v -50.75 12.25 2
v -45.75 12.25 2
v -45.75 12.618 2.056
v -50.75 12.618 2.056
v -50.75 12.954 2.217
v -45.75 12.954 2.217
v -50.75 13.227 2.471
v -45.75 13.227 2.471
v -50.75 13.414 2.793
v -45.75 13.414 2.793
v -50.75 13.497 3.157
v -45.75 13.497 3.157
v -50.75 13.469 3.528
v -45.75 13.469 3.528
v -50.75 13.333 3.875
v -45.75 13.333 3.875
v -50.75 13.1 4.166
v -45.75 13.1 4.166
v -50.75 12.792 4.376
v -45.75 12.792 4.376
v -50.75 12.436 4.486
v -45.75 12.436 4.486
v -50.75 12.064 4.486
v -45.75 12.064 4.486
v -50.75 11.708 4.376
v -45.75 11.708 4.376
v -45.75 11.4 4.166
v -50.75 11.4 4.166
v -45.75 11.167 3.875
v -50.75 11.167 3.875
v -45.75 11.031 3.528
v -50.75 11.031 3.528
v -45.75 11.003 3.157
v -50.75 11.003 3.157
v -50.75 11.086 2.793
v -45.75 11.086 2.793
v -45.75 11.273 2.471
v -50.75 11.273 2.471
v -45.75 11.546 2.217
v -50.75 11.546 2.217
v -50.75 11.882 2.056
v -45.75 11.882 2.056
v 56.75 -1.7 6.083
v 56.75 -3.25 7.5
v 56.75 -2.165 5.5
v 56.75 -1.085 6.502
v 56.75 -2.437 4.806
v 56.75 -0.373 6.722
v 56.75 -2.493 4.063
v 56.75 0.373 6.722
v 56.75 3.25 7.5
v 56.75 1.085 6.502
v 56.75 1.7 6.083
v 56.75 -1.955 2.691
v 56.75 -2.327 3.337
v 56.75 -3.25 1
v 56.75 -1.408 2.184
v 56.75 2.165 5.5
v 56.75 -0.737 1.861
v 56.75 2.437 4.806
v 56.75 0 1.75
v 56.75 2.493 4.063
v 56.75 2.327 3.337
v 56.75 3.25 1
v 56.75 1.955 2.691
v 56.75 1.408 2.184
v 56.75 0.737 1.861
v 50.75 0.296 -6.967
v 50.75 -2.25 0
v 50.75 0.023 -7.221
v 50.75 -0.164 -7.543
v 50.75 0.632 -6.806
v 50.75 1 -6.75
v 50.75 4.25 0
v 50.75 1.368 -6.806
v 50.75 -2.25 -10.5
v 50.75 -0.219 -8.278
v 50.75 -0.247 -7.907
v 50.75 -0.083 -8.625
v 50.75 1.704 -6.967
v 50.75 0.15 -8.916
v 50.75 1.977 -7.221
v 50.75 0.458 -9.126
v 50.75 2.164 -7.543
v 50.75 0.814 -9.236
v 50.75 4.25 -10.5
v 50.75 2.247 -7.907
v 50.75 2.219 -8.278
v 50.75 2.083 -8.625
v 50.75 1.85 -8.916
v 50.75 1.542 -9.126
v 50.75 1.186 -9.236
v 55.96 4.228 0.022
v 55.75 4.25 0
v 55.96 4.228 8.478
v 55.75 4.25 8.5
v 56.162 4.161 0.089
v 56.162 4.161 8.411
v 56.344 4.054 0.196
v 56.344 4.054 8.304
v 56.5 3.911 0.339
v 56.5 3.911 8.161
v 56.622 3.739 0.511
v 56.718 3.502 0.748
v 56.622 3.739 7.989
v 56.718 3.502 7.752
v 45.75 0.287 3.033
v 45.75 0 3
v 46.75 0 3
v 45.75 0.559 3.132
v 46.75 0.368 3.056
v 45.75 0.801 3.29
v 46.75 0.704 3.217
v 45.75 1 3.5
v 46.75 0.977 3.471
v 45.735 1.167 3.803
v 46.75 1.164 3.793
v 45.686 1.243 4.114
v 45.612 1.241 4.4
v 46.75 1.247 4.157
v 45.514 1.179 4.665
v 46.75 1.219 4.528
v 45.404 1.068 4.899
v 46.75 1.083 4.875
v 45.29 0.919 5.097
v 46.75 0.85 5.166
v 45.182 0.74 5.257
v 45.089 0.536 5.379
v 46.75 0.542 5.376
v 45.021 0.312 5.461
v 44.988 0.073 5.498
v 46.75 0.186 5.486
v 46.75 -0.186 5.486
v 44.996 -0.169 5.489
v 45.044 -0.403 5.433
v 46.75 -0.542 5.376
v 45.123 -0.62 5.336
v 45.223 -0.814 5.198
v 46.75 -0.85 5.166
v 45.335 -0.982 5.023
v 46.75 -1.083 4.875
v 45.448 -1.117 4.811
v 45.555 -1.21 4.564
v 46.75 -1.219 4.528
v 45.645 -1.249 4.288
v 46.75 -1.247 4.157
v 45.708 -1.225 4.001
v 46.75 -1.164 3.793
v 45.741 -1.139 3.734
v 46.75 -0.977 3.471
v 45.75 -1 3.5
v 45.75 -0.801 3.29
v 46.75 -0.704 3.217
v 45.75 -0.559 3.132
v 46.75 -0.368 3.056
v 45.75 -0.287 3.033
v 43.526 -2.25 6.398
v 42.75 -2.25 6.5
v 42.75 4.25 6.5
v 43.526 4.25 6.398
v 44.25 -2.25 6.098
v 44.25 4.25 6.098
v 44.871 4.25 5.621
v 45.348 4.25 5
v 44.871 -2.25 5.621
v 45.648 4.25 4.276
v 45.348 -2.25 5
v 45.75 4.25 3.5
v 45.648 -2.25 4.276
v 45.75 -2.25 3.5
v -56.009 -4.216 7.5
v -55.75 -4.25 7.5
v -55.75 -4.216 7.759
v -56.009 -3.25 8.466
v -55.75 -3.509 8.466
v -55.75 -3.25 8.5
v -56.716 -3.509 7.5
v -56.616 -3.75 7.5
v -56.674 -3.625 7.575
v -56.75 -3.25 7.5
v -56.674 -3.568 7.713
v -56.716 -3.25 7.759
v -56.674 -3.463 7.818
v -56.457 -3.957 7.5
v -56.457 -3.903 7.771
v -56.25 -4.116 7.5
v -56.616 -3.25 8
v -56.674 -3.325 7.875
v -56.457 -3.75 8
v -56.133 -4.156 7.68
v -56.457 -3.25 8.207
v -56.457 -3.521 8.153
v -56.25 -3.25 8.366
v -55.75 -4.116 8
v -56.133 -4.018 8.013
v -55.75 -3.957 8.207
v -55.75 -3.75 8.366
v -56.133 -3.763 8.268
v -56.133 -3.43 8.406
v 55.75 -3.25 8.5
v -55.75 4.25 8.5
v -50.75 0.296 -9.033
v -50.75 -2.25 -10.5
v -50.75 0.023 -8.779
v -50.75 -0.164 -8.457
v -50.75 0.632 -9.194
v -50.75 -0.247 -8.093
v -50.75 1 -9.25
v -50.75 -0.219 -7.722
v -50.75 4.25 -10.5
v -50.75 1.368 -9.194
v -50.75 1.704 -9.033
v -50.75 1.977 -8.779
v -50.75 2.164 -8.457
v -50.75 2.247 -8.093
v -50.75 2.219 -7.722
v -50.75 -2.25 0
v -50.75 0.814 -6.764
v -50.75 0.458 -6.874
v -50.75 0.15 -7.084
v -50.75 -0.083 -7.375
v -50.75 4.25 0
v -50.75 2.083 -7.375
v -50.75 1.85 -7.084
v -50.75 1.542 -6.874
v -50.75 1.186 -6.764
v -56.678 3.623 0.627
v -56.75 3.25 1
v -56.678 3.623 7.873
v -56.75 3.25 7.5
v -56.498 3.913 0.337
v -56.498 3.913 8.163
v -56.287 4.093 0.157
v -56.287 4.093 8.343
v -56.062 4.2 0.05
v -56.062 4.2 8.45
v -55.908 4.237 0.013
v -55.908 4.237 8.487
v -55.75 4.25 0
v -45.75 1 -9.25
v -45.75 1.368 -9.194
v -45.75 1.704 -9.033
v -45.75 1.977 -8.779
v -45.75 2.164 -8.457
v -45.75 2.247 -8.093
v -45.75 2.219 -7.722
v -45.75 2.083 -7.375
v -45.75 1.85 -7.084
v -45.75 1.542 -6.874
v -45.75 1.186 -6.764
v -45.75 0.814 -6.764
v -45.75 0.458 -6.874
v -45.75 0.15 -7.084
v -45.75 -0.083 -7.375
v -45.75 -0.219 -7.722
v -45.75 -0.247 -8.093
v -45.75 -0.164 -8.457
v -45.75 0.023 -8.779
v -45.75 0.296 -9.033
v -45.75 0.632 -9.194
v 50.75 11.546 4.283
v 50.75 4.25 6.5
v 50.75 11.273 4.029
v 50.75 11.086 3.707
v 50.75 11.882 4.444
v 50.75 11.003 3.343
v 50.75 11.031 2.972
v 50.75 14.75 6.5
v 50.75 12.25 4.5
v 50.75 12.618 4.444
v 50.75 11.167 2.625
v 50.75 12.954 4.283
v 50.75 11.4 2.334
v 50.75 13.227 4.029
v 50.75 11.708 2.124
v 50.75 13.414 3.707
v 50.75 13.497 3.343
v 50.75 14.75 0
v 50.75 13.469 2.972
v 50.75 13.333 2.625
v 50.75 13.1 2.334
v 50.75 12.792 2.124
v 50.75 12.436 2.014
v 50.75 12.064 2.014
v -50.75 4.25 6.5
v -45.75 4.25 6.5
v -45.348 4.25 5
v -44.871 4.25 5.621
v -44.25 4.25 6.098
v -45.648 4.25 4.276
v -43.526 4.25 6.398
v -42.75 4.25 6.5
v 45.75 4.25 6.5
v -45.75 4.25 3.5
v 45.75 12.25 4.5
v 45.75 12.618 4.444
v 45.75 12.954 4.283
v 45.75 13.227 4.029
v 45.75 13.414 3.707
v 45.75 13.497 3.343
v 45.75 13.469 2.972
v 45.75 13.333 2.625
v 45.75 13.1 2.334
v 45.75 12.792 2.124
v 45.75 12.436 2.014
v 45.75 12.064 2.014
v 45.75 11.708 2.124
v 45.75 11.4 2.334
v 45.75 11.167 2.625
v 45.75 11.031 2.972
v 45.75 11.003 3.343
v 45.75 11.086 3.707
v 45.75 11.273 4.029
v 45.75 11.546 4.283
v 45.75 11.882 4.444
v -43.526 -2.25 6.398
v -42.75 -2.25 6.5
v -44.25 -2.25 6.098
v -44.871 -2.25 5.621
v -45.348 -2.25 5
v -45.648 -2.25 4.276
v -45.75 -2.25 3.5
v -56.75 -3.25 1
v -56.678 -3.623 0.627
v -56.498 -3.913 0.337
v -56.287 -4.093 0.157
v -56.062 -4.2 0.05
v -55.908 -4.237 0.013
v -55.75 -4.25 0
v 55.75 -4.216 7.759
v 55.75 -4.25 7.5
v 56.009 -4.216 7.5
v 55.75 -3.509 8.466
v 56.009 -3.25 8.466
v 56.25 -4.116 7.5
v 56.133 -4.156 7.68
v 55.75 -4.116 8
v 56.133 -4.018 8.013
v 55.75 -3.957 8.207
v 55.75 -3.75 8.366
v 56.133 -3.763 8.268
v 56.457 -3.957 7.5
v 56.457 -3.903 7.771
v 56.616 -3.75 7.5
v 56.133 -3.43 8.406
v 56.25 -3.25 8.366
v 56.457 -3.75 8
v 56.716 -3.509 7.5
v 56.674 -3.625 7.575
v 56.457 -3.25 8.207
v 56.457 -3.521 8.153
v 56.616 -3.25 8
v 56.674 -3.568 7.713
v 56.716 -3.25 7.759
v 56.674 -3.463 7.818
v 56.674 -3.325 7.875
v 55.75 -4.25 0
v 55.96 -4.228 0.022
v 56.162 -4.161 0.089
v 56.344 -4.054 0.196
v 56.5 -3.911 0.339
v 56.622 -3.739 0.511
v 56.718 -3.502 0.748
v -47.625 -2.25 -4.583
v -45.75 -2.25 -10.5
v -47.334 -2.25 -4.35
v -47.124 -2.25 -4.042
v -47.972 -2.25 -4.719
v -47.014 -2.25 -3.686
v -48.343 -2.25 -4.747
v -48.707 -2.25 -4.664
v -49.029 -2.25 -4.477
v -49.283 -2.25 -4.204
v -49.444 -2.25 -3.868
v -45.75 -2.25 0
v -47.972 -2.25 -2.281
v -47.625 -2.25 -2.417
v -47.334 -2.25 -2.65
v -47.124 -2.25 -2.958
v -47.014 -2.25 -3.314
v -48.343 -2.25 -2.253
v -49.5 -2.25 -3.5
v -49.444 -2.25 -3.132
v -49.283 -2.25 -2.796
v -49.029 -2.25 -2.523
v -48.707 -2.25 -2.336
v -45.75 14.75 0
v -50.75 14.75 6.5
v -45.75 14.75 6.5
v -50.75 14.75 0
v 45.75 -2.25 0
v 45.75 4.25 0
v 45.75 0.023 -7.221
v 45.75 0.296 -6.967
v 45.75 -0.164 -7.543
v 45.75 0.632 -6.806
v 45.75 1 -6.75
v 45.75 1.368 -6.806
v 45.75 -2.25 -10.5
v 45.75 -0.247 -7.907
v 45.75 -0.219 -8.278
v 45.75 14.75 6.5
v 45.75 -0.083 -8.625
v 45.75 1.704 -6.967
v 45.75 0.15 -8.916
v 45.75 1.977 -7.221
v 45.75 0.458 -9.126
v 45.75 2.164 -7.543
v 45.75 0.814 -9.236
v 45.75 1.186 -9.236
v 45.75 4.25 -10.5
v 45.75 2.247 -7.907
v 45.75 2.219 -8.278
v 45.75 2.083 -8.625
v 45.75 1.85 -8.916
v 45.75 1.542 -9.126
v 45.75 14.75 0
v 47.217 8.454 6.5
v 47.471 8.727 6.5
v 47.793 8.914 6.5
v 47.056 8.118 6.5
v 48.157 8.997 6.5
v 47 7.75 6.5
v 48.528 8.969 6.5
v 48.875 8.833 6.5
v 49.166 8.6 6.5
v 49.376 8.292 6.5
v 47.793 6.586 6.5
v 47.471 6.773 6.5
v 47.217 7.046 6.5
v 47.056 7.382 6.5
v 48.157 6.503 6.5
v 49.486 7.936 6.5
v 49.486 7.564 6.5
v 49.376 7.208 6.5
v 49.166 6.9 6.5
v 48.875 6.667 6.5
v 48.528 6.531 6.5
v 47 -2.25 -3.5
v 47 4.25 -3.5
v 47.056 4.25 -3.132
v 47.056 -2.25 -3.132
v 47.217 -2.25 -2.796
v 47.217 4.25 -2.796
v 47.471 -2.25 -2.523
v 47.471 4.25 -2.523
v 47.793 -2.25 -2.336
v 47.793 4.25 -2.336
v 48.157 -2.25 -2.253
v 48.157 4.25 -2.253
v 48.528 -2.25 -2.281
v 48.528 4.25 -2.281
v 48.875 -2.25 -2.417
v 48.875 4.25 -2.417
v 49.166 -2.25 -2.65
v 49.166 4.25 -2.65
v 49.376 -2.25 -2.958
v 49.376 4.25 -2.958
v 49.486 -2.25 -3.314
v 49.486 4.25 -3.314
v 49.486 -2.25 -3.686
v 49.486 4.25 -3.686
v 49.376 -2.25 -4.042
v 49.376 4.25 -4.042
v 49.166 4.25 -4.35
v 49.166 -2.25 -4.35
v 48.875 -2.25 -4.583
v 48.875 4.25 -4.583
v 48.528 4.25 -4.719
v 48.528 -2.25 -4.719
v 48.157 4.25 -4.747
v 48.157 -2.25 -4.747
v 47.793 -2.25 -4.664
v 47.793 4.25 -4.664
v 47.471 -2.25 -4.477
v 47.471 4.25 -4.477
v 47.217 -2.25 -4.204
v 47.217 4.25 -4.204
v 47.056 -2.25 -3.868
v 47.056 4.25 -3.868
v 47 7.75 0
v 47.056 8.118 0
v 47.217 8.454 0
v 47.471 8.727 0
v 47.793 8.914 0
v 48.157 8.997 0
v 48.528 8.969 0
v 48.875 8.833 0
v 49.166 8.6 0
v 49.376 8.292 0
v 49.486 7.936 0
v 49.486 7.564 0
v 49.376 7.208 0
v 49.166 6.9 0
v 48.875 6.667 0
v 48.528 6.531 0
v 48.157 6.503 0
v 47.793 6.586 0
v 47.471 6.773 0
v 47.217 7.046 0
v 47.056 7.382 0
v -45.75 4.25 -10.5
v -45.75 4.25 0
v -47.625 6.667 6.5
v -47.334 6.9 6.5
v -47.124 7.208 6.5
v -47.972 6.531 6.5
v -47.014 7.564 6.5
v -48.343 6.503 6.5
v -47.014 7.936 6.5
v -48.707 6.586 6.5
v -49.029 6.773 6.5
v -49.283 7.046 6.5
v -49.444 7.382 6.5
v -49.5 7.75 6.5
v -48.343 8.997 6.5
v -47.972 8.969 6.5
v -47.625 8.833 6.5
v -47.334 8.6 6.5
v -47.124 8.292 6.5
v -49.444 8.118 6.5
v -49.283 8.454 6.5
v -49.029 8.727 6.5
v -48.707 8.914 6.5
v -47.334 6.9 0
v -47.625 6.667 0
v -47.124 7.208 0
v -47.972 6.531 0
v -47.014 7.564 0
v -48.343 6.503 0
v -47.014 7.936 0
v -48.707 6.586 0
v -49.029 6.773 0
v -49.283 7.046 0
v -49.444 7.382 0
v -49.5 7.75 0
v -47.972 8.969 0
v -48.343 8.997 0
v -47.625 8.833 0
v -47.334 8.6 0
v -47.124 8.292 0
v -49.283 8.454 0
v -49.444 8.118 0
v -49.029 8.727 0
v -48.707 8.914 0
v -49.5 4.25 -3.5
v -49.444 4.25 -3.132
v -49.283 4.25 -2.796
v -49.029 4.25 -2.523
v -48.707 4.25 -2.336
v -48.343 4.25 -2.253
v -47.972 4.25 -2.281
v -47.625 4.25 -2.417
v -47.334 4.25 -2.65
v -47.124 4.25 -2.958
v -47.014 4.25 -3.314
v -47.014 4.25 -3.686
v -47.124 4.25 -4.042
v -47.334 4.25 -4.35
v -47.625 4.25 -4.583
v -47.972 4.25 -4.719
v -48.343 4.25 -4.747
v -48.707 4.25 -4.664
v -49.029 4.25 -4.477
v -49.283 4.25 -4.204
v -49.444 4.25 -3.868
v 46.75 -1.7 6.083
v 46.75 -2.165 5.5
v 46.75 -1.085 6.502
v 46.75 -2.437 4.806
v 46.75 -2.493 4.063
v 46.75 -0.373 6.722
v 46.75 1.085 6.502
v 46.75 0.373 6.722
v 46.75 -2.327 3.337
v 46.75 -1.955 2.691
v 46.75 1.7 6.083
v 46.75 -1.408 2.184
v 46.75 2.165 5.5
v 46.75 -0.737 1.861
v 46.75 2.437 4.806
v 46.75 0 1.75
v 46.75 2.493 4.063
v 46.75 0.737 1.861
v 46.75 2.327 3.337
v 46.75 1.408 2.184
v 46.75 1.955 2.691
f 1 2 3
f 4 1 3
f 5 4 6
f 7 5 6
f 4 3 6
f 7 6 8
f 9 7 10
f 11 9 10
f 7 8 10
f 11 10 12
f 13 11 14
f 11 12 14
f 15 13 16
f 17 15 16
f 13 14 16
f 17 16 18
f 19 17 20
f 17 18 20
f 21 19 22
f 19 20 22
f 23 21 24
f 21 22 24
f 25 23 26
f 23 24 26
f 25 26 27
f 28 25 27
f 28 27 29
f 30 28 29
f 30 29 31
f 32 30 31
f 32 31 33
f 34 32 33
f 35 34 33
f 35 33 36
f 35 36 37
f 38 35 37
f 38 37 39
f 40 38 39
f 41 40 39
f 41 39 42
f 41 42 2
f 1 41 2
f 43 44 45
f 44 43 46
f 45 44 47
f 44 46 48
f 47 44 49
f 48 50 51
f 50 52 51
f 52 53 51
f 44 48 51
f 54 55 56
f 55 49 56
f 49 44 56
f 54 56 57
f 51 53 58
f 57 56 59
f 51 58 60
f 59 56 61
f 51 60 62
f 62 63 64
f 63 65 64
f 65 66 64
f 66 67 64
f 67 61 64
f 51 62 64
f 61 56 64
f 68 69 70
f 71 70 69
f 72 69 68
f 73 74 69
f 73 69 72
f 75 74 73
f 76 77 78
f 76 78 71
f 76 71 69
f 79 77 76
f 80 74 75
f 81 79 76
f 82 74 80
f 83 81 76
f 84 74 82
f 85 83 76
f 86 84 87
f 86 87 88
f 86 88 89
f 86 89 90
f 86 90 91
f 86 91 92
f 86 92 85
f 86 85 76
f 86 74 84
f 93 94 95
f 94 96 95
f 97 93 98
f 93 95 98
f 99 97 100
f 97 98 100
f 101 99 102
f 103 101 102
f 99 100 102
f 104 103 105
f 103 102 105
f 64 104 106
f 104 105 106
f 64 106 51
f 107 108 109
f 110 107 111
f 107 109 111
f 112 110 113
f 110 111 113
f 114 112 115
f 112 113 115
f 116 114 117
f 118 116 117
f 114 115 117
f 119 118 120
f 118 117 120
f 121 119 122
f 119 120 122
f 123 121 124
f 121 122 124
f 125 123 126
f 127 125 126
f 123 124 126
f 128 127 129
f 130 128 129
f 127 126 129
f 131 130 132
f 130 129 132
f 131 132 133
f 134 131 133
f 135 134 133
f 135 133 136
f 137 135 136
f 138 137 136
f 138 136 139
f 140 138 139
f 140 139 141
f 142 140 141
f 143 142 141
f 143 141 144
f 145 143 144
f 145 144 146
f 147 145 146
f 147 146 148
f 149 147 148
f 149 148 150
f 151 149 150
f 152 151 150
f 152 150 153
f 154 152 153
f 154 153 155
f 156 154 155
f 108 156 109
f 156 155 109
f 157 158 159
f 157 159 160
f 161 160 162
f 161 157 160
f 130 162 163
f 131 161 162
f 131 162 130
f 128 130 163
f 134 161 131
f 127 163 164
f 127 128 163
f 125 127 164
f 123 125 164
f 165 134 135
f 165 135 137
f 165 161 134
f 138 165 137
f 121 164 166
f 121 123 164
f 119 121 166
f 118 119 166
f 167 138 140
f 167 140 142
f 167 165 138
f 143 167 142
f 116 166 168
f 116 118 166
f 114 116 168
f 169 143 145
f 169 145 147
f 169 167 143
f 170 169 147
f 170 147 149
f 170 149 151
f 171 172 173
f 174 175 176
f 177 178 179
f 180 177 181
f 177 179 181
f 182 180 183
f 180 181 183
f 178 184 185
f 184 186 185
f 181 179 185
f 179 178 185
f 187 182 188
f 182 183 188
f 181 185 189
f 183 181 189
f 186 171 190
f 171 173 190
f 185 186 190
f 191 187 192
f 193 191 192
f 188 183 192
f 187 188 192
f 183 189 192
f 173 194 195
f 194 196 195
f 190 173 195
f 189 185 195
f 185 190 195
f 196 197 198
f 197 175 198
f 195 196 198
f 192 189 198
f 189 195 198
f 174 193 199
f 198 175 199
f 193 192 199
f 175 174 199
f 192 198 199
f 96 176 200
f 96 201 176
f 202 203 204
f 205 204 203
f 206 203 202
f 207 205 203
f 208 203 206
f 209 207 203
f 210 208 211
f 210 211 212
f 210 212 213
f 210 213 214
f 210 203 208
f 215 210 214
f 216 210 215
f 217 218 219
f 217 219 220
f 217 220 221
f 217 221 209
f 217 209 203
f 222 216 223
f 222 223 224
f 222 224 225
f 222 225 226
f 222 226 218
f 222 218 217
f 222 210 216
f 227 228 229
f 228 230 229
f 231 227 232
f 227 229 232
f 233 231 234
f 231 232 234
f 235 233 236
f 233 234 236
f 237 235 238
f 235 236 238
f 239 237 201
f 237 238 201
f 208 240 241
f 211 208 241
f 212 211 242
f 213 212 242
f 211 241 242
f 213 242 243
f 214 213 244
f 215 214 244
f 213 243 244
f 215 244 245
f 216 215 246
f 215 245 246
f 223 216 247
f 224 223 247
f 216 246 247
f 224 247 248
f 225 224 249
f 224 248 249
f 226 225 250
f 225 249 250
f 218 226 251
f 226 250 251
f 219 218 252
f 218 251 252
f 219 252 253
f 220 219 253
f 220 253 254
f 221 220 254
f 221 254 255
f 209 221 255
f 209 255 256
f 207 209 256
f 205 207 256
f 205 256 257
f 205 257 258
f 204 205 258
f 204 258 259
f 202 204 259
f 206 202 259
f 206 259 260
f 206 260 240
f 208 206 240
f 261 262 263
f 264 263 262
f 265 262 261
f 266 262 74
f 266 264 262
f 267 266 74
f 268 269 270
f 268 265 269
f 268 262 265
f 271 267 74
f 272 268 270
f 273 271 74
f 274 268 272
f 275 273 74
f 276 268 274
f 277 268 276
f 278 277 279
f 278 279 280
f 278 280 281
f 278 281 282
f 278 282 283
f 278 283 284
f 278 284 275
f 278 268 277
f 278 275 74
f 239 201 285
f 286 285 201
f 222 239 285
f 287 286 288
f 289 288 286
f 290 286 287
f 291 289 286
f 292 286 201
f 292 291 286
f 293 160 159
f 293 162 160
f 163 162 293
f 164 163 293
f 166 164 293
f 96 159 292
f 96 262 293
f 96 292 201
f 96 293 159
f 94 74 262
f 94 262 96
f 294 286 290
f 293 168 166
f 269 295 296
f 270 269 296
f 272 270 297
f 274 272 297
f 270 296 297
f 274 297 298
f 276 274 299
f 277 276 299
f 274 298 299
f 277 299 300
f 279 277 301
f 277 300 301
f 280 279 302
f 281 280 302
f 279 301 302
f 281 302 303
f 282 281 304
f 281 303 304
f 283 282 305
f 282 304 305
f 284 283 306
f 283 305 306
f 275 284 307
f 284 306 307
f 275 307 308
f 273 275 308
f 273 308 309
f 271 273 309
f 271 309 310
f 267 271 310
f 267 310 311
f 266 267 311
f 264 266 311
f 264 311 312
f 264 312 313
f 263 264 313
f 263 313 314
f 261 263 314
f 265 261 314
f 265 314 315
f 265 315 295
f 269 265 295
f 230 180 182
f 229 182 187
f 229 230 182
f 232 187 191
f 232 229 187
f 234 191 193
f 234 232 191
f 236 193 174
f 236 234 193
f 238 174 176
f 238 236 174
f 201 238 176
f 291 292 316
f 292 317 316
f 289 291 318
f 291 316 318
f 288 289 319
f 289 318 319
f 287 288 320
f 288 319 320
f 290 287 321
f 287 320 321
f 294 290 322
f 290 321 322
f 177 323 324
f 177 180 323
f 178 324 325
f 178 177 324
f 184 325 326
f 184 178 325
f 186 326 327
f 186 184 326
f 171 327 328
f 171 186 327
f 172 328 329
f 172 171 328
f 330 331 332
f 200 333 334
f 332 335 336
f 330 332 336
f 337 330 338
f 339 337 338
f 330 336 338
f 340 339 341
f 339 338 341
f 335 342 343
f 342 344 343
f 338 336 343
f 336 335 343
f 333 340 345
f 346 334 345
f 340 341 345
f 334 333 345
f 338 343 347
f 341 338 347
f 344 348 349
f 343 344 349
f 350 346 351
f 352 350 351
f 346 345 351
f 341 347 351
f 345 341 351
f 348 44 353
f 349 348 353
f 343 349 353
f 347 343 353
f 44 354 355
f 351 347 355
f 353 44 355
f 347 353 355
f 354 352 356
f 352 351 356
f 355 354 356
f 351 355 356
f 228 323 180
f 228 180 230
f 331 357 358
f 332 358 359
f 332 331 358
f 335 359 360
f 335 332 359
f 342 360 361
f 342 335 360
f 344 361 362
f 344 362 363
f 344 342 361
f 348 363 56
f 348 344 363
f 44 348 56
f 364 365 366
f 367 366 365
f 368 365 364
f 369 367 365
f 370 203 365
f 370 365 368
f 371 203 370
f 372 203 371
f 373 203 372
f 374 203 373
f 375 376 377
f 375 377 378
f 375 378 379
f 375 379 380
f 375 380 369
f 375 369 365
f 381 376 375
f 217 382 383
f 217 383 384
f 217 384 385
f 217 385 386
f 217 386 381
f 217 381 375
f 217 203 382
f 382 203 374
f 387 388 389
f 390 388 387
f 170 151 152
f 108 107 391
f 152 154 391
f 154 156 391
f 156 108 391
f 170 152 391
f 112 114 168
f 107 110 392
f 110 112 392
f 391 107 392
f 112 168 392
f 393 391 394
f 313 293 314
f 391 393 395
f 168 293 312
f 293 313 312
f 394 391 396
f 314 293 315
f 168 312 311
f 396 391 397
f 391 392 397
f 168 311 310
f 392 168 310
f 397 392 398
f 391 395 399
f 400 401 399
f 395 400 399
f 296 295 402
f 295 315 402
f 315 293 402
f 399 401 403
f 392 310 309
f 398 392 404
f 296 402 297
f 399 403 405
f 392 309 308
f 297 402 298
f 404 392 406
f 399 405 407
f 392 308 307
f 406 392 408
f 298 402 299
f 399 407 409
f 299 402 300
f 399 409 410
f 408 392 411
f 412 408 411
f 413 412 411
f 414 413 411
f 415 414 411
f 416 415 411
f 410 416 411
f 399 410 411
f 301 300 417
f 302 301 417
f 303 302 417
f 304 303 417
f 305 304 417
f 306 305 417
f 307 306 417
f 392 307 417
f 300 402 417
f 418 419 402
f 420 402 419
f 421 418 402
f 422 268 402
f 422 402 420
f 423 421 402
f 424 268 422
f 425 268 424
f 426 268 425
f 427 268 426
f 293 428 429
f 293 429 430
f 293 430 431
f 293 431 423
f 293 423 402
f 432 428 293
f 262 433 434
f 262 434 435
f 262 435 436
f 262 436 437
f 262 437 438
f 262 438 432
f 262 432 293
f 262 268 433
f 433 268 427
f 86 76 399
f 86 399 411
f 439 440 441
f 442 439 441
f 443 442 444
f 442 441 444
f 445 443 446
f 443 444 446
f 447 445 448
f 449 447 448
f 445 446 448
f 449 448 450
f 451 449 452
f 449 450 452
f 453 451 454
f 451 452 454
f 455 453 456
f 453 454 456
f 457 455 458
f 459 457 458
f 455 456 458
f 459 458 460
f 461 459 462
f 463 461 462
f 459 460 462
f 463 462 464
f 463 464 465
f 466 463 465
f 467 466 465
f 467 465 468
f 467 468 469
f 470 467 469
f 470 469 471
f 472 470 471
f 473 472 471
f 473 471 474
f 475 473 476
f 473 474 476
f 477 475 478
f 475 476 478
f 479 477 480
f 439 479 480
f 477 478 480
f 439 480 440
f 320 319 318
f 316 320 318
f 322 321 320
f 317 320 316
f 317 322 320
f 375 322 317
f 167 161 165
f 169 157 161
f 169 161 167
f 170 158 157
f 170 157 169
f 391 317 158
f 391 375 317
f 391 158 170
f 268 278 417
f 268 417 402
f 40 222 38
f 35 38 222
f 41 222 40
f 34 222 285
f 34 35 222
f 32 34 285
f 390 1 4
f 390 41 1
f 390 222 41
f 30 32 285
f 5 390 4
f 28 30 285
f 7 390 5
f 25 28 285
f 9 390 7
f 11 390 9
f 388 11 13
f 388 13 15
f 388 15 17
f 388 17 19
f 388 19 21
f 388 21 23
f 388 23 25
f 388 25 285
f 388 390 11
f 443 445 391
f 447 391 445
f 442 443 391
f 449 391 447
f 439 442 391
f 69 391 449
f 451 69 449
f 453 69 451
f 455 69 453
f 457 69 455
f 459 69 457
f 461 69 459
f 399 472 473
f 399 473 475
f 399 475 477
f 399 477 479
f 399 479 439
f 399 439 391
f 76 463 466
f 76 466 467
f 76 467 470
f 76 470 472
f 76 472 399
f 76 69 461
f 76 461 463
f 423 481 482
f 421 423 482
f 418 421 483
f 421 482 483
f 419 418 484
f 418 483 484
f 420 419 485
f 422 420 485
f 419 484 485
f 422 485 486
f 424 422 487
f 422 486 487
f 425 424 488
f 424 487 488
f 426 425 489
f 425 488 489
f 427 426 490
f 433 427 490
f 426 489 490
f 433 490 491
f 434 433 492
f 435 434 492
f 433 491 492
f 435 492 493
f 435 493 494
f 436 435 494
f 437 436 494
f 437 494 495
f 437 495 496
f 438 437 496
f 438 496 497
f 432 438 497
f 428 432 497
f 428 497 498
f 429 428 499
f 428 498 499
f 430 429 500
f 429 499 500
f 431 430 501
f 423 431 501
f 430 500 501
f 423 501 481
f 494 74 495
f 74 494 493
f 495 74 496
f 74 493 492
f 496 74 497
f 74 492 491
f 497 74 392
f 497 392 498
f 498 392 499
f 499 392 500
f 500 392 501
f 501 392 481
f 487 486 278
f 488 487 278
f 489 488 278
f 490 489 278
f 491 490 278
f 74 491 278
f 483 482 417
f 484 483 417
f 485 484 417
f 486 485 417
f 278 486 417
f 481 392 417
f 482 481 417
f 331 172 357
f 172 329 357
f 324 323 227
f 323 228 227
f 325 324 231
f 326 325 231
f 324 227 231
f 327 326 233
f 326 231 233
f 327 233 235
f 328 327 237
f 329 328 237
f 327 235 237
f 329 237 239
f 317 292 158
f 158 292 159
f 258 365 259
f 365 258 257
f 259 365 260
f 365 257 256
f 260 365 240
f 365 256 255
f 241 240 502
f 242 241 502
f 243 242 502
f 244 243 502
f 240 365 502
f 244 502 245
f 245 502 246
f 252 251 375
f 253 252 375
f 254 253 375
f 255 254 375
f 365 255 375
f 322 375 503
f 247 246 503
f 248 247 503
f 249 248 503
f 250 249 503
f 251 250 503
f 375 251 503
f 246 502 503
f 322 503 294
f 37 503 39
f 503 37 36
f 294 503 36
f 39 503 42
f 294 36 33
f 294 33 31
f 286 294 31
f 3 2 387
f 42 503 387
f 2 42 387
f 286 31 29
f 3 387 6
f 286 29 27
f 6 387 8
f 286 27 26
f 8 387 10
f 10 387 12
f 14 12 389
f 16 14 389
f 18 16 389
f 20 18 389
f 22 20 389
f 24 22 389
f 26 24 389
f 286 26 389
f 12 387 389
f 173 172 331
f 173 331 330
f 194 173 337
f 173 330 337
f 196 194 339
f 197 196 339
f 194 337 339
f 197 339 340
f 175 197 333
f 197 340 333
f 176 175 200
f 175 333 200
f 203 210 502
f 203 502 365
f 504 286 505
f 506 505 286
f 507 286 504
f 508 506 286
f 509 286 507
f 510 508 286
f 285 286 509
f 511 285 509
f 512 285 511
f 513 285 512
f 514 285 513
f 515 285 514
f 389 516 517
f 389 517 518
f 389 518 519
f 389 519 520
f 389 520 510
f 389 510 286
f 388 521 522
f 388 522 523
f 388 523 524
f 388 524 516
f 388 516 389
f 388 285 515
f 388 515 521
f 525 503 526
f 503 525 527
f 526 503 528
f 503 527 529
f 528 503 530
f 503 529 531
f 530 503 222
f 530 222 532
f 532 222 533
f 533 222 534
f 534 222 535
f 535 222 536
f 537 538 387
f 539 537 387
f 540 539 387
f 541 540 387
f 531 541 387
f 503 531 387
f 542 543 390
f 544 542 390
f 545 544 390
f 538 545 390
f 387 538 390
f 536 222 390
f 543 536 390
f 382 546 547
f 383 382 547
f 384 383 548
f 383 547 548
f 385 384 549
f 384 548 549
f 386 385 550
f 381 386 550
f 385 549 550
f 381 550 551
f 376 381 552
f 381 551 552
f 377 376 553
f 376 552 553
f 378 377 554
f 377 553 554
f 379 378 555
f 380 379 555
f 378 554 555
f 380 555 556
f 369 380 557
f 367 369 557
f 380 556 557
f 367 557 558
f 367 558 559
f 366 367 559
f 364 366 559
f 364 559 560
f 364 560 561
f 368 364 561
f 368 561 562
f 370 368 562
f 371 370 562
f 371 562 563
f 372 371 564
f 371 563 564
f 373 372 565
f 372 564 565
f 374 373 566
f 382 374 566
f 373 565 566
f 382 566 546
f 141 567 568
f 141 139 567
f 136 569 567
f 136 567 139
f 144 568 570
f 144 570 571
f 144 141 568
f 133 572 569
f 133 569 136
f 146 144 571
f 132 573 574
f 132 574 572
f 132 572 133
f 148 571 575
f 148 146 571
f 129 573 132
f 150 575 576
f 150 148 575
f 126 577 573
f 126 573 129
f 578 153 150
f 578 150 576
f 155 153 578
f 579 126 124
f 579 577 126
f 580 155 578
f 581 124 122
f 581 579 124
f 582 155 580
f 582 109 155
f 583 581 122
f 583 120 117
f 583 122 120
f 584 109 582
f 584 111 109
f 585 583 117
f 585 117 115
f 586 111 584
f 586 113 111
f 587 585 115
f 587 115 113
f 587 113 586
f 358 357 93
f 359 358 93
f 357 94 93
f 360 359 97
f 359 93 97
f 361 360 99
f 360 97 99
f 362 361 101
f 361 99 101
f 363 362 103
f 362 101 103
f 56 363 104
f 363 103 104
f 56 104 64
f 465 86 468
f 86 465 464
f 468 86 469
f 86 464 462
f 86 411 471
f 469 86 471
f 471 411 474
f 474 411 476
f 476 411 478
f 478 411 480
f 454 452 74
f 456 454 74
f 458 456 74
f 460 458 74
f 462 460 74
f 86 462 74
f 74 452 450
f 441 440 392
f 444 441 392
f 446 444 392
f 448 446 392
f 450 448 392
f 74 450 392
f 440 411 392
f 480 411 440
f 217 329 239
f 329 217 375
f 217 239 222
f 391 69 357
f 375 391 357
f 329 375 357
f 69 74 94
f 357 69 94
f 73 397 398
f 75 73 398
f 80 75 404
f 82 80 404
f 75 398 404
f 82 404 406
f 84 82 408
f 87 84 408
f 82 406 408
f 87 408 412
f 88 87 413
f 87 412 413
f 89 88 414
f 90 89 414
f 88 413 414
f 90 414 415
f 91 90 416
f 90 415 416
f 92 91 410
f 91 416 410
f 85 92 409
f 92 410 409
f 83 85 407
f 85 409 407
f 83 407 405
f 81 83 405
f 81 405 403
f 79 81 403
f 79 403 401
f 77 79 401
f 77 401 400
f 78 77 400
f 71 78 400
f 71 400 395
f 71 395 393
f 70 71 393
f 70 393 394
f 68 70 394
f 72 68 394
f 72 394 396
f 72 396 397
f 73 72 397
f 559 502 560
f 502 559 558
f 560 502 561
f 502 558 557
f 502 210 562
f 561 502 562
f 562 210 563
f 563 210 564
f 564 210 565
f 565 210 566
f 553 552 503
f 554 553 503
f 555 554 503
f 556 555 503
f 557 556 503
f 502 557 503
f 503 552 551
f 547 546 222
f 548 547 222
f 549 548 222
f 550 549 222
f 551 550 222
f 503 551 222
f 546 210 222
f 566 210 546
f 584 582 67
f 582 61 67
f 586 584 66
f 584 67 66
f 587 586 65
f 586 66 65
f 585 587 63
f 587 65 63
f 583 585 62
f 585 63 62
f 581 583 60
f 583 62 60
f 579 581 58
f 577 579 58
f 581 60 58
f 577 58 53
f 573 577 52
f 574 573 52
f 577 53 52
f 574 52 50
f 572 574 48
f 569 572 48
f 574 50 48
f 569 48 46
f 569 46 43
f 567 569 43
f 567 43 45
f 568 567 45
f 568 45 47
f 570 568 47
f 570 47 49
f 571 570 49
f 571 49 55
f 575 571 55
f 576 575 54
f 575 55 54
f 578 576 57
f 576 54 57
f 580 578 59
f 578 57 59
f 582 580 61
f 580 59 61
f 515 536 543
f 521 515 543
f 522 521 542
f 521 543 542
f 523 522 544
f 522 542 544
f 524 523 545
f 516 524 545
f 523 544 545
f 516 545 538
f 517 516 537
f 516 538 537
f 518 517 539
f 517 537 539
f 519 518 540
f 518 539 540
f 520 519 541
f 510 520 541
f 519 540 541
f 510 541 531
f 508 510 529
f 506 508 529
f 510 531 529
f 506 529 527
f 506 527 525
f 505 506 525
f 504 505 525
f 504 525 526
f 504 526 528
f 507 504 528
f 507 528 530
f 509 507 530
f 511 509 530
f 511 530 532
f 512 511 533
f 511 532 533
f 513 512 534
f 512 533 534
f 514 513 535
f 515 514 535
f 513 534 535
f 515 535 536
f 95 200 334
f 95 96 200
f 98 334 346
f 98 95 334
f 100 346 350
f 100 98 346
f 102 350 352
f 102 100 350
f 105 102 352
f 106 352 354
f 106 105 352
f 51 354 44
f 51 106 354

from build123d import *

# Parameters (mm, degrees)
SKETCH1_W                 = 113.5
SKETCH1_H                 = 8.5
BOSS_EXTRUDE1_DEPTH       = 8.5
BOSS_EXTRUDE2_DEPTH       = 5
BOSS_EXTRUDE3_DEPTH       = 5
SKETCH13_W                = 91.5
SKETCH13_H                = 6.5
CUT_EXTRUDE1_DEPTH        = 6.5
M3X0_5_TAPPED_HOLE1_D     = 2.5
M3X0_5_TAPPED_HOLE1_DEPTH = 7.5
M3X0_5_TAPPED_HOLE1_TIP   = 0.751075774
M3X0_5_TAPPED_HOLE2_D     = 2.5
M3X0_5_TAPPED_HOLE2_DEPTH = 5
M3X0_5_TAPPED_HOLE3_D     = 2.5
M3X0_5_TAPPED_HOLE3_DEPTH = 5
M3X0_5_TAPPED_HOLE4_D     = 2.5
M3X0_5_TAPPED_HOLE4_DEPTH = 7.5
M3X0_5_TAPPED_HOLE4_TIP   = 0.751075774
FILLET1_R                 = 1
FILLET2_R                 = 1
FILLET3_R                 = 1
FILLET4_R                 = 3
M3X0_5_TAPPED_HOLE5_D     = 2.5
M3X0_5_TAPPED_HOLE5_DEPTH = 7.5
M3X0_5_TAPPED_HOLE5_TIP   = 0.751075774
M3X0_5_TAPPED_HOLE6_D     = 2.5
M3X0_5_TAPPED_HOLE6_DEPTH = 7.5
M3X0_5_TAPPED_HOLE6_TIP   = 0.751075774
M3X0_5_TAPPED_HOLE7_D     = 2.5
M3X0_5_TAPPED_HOLE7_DEPTH = 7.5
M3X0_5_TAPPED_HOLE7_TIP   = 0.751075774
M3X0_5_TAPPED_HOLE9_D     = 2.5
M3X0_5_TAPPED_HOLE9_DEPTH = 7.5
M3X0_5_TAPPED_HOLE9_TIP   = 0.751075774
SKETCH43_W                = 10.5
SKETCH43_H                = 10.5
CUT_EXTRUDE3_DEPTH        = 110.01404726
SKETCH44_R                = 2.5
CUT_EXTRUDE4_DEPTH        = 10
CUT_EXTRUDE5_REACH        = 107.072
SKETCH45_R                = 1.25
M6_TAPPED_HOLE1_D         = 5
M6_TAPPED_HOLE1_DEPTH     = 3.05
M6_TAPPED_HOLE1_TIP       = 1.502151548


with BuildPart() as part:
    # Sketch1 → Boss-Extrude1 (new body)
    with BuildSketch(Plane.XY):
        Rectangle(SKETCH1_W, SKETCH1_H)
    extrude(amount=BOSS_EXTRUDE1_DEPTH)

    # Sketch4 → Boss-Extrude2 (add)
    with BuildSketch(Plane(origin=(50.75, 0, 0), x_dir=(0, 0, -1), z_dir=(1, 0, 0))):
        Polygon((0, -2.25), (10.5, -2.25), (10.5, 14.75), (-6.5, 14.75), (-6.5, 4.25), (0, 4.25), align=None)
    extrude(amount=-BOSS_EXTRUDE2_DEPTH)

    # Sketch12 → Boss-Extrude3 (add)
    with BuildSketch(Plane.ZY.offset(50.75)):
        Polygon((6.5, 4.25), (6.5, 14.75), (-10.5, 14.75), (-10.5, -2.25), (0, -2.25), (0, 4.25), align=None)
    extrude(amount=-BOSS_EXTRUDE3_DEPTH)

    # Sketch13 → Cut-Extrude1 (cut)
    with BuildSketch(Plane(origin=(0, 4.25, 0), x_dir=(1, 0, 0), z_dir=(0, 1, 0))):
        with Locations((0, -3.25)):
            Rectangle(SKETCH13_W, SKETCH13_H)
    extrude(amount=-CUT_EXTRUDE1_DEPTH, mode=Mode.SUBTRACT)

    # M3x0.5 Tapped Hole1
    with Locations(Plane.XY.offset(6.5)):
        with Locations((-48.25, 7.75)):
            Hole(M3X0_5_TAPPED_HOLE1_D / 2, depth=M3X0_5_TAPPED_HOLE1_DEPTH)
            with Locations((0, 0, -(M3X0_5_TAPPED_HOLE1_DEPTH + M3X0_5_TAPPED_HOLE1_TIP / 2))):  # 118° drill point
                Cone(0, M3X0_5_TAPPED_HOLE1_D / 2, M3X0_5_TAPPED_HOLE1_TIP, mode=Mode.SUBTRACT)

    # M3x0.5 Tapped Hole2
    with Locations(Plane.ZY.offset(50.75)):
        with Locations((3.25, 12.25)):
            Hole(M3X0_5_TAPPED_HOLE2_D / 2, depth=M3X0_5_TAPPED_HOLE2_DEPTH)

    # M3x0.5 Tapped Hole3
    with Locations(Plane.ZY.offset(50.75)):
        with Locations((-8, 1)):
            Hole(M3X0_5_TAPPED_HOLE3_D / 2, depth=M3X0_5_TAPPED_HOLE3_DEPTH)

    # M3x0.5 Tapped Hole4
    with Locations(Plane.XZ.offset(2.25)):
        with Locations((-48.25, -3.5)):
            Hole(M3X0_5_TAPPED_HOLE4_D / 2, depth=M3X0_5_TAPPED_HOLE4_DEPTH)
            with Locations((0, 0, -(M3X0_5_TAPPED_HOLE4_DEPTH + M3X0_5_TAPPED_HOLE4_TIP / 2))):  # 118° drill point
                Cone(0, M3X0_5_TAPPED_HOLE4_D / 2, M3X0_5_TAPPED_HOLE4_TIP, mode=Mode.SUBTRACT)

    # Fillet1
    fillet1_edges = [part.edges().sort_by_distance(p)[0] for p in [
        (0, -4.25, 8.5),
    ]]
    fillet(fillet1_edges, radius=FILLET1_R)

    # Fillet2
    fillet2_edges = [part.edges().sort_by_distance(p)[0] for p in [
        (-56.75, 0.5, 8.5),
        (-56.75, 0, 0),
        (-56.75, 4.25, 4.25),
        (-56.75, -4.25, 3.75),
        (-56.75, -3.957106781, 8.207106781),
    ]]
    fillet(fillet2_edges, radius=FILLET2_R)

    # Fillet3
    fillet3_edges = [part.edges().sort_by_distance(p)[0] for p in [
        (56.75, 0, 0),
        (56.75, 4.25, 4.25),
        (56.75, 0.5, 8.5),
        (56.75, -4.25, 3.75),
        (56.75, -3.957106781, 8.207106781),
    ]]
    fillet(fillet3_edges, radius=FILLET3_R)

    # Fillet4
    fillet4_edges = [part.edges().sort_by_distance(p)[0] for p in [
        (-45.75, 1, 6.5),
        (45.75, 1, 6.5),
    ]]
    fillet(fillet4_edges, radius=FILLET4_R)

    # M3x0.5 Tapped Hole5
    with Locations(Plane.XY.offset(6.5)):
        with Locations((48.25, 7.75)):
            Hole(M3X0_5_TAPPED_HOLE5_D / 2, depth=M3X0_5_TAPPED_HOLE5_DEPTH)
            with Locations((0, 0, -(M3X0_5_TAPPED_HOLE5_DEPTH + M3X0_5_TAPPED_HOLE5_TIP / 2))):  # 118° drill point
                Cone(0, M3X0_5_TAPPED_HOLE5_D / 2, M3X0_5_TAPPED_HOLE5_TIP, mode=Mode.SUBTRACT)

    # M3x0.5 Tapped Hole6
    with Locations(Plane.XZ.offset(2.25)):
        with Locations((48.25, -3.5)):
            Hole(M3X0_5_TAPPED_HOLE6_D / 2, depth=M3X0_5_TAPPED_HOLE6_DEPTH)
            with Locations((0, 0, -(M3X0_5_TAPPED_HOLE6_DEPTH + M3X0_5_TAPPED_HOLE6_TIP / 2))):  # 118° drill point
                Cone(0, M3X0_5_TAPPED_HOLE6_D / 2, M3X0_5_TAPPED_HOLE6_TIP, mode=Mode.SUBTRACT)

    # M3x0.5 Tapped Hole7
    with Locations(Plane(origin=(50.75, 0, 0), x_dir=(0, 0, -1), z_dir=(1, 0, 0))):
        with Locations((8, 1)):
            Hole(M3X0_5_TAPPED_HOLE7_D / 2, depth=M3X0_5_TAPPED_HOLE7_DEPTH)
            with Locations((0, 0, -(M3X0_5_TAPPED_HOLE7_DEPTH + M3X0_5_TAPPED_HOLE7_TIP / 2))):  # 118° drill point
                Cone(0, M3X0_5_TAPPED_HOLE7_D / 2, M3X0_5_TAPPED_HOLE7_TIP, mode=Mode.SUBTRACT)

    # M3x0.5 Tapped Hole9
    with Locations(Plane(origin=(50.75, 0, 0), x_dir=(0, 0, -1), z_dir=(1, 0, 0))):
        with Locations((-3.25, 12.25)):
            Hole(M3X0_5_TAPPED_HOLE9_D / 2, depth=M3X0_5_TAPPED_HOLE9_DEPTH)
            with Locations((0, 0, -(M3X0_5_TAPPED_HOLE9_DEPTH + M3X0_5_TAPPED_HOLE9_TIP / 2))):  # 118° drill point
                Cone(0, M3X0_5_TAPPED_HOLE9_D / 2, M3X0_5_TAPPED_HOLE9_TIP, mode=Mode.SUBTRACT)

    # Sketch43 → Cut-Extrude3 (cut, through all)
    with BuildSketch(Plane.ZY.offset(50.75)):
        with Locations((-5.25, 9.5)):
            Rectangle(SKETCH43_W, SKETCH43_H)
    extrude(amount=-CUT_EXTRUDE3_DEPTH, mode=Mode.SUBTRACT)

    # Sketch44 → Cut-Extrude4 (cut)
    with BuildSketch(Plane(origin=(56.75, 0, 0), x_dir=(0, 0, -1), z_dir=(1, 0, 0))):
        with Locations((-4.25, 0)):
            Circle(SKETCH44_R)
    extrude(amount=-CUT_EXTRUDE4_DEPTH, mode=Mode.SUBTRACT)

    # Sketch45 → Cut-Extrude5 (cut, up to next)
    with BuildSketch(Plane(origin=(46.75, 0, 0), x_dir=(0, 0, -1), z_dir=(1, 0, 0)), mode=Mode.PRIVATE) as cut_extrude5_sk1:
        with Locations((-4.25, 0)):
            Circle(SKETCH45_R)
    cut_extrude5_tool1 = extrude(cut_extrude5_sk1.sketch, amount=-CUT_EXTRUDE5_REACH, mode=Mode.PRIVATE) & part.part
    add(cut_extrude5_tool1.solids().sort_by_distance((46.75, 0, 4.25))[0], mode=Mode.SUBTRACT)

    # M6 Tapped Hole1
    with Locations(Plane(origin=(56.75, 0, 0), x_dir=(0, 0, -1), z_dir=(1, 0, 0))):
        with Locations((-4.25, 0)):
            Hole(M6_TAPPED_HOLE1_D / 2, depth=M6_TAPPED_HOLE1_DEPTH)
            with Locations((0, 0, -(M6_TAPPED_HOLE1_DEPTH + M6_TAPPED_HOLE1_TIP / 2))):  # 118° drill point
                Cone(0, M6_TAPPED_HOLE1_D / 2, M6_TAPPED_HOLE1_TIP, mode=Mode.SUBTRACT)


solid = part.part
